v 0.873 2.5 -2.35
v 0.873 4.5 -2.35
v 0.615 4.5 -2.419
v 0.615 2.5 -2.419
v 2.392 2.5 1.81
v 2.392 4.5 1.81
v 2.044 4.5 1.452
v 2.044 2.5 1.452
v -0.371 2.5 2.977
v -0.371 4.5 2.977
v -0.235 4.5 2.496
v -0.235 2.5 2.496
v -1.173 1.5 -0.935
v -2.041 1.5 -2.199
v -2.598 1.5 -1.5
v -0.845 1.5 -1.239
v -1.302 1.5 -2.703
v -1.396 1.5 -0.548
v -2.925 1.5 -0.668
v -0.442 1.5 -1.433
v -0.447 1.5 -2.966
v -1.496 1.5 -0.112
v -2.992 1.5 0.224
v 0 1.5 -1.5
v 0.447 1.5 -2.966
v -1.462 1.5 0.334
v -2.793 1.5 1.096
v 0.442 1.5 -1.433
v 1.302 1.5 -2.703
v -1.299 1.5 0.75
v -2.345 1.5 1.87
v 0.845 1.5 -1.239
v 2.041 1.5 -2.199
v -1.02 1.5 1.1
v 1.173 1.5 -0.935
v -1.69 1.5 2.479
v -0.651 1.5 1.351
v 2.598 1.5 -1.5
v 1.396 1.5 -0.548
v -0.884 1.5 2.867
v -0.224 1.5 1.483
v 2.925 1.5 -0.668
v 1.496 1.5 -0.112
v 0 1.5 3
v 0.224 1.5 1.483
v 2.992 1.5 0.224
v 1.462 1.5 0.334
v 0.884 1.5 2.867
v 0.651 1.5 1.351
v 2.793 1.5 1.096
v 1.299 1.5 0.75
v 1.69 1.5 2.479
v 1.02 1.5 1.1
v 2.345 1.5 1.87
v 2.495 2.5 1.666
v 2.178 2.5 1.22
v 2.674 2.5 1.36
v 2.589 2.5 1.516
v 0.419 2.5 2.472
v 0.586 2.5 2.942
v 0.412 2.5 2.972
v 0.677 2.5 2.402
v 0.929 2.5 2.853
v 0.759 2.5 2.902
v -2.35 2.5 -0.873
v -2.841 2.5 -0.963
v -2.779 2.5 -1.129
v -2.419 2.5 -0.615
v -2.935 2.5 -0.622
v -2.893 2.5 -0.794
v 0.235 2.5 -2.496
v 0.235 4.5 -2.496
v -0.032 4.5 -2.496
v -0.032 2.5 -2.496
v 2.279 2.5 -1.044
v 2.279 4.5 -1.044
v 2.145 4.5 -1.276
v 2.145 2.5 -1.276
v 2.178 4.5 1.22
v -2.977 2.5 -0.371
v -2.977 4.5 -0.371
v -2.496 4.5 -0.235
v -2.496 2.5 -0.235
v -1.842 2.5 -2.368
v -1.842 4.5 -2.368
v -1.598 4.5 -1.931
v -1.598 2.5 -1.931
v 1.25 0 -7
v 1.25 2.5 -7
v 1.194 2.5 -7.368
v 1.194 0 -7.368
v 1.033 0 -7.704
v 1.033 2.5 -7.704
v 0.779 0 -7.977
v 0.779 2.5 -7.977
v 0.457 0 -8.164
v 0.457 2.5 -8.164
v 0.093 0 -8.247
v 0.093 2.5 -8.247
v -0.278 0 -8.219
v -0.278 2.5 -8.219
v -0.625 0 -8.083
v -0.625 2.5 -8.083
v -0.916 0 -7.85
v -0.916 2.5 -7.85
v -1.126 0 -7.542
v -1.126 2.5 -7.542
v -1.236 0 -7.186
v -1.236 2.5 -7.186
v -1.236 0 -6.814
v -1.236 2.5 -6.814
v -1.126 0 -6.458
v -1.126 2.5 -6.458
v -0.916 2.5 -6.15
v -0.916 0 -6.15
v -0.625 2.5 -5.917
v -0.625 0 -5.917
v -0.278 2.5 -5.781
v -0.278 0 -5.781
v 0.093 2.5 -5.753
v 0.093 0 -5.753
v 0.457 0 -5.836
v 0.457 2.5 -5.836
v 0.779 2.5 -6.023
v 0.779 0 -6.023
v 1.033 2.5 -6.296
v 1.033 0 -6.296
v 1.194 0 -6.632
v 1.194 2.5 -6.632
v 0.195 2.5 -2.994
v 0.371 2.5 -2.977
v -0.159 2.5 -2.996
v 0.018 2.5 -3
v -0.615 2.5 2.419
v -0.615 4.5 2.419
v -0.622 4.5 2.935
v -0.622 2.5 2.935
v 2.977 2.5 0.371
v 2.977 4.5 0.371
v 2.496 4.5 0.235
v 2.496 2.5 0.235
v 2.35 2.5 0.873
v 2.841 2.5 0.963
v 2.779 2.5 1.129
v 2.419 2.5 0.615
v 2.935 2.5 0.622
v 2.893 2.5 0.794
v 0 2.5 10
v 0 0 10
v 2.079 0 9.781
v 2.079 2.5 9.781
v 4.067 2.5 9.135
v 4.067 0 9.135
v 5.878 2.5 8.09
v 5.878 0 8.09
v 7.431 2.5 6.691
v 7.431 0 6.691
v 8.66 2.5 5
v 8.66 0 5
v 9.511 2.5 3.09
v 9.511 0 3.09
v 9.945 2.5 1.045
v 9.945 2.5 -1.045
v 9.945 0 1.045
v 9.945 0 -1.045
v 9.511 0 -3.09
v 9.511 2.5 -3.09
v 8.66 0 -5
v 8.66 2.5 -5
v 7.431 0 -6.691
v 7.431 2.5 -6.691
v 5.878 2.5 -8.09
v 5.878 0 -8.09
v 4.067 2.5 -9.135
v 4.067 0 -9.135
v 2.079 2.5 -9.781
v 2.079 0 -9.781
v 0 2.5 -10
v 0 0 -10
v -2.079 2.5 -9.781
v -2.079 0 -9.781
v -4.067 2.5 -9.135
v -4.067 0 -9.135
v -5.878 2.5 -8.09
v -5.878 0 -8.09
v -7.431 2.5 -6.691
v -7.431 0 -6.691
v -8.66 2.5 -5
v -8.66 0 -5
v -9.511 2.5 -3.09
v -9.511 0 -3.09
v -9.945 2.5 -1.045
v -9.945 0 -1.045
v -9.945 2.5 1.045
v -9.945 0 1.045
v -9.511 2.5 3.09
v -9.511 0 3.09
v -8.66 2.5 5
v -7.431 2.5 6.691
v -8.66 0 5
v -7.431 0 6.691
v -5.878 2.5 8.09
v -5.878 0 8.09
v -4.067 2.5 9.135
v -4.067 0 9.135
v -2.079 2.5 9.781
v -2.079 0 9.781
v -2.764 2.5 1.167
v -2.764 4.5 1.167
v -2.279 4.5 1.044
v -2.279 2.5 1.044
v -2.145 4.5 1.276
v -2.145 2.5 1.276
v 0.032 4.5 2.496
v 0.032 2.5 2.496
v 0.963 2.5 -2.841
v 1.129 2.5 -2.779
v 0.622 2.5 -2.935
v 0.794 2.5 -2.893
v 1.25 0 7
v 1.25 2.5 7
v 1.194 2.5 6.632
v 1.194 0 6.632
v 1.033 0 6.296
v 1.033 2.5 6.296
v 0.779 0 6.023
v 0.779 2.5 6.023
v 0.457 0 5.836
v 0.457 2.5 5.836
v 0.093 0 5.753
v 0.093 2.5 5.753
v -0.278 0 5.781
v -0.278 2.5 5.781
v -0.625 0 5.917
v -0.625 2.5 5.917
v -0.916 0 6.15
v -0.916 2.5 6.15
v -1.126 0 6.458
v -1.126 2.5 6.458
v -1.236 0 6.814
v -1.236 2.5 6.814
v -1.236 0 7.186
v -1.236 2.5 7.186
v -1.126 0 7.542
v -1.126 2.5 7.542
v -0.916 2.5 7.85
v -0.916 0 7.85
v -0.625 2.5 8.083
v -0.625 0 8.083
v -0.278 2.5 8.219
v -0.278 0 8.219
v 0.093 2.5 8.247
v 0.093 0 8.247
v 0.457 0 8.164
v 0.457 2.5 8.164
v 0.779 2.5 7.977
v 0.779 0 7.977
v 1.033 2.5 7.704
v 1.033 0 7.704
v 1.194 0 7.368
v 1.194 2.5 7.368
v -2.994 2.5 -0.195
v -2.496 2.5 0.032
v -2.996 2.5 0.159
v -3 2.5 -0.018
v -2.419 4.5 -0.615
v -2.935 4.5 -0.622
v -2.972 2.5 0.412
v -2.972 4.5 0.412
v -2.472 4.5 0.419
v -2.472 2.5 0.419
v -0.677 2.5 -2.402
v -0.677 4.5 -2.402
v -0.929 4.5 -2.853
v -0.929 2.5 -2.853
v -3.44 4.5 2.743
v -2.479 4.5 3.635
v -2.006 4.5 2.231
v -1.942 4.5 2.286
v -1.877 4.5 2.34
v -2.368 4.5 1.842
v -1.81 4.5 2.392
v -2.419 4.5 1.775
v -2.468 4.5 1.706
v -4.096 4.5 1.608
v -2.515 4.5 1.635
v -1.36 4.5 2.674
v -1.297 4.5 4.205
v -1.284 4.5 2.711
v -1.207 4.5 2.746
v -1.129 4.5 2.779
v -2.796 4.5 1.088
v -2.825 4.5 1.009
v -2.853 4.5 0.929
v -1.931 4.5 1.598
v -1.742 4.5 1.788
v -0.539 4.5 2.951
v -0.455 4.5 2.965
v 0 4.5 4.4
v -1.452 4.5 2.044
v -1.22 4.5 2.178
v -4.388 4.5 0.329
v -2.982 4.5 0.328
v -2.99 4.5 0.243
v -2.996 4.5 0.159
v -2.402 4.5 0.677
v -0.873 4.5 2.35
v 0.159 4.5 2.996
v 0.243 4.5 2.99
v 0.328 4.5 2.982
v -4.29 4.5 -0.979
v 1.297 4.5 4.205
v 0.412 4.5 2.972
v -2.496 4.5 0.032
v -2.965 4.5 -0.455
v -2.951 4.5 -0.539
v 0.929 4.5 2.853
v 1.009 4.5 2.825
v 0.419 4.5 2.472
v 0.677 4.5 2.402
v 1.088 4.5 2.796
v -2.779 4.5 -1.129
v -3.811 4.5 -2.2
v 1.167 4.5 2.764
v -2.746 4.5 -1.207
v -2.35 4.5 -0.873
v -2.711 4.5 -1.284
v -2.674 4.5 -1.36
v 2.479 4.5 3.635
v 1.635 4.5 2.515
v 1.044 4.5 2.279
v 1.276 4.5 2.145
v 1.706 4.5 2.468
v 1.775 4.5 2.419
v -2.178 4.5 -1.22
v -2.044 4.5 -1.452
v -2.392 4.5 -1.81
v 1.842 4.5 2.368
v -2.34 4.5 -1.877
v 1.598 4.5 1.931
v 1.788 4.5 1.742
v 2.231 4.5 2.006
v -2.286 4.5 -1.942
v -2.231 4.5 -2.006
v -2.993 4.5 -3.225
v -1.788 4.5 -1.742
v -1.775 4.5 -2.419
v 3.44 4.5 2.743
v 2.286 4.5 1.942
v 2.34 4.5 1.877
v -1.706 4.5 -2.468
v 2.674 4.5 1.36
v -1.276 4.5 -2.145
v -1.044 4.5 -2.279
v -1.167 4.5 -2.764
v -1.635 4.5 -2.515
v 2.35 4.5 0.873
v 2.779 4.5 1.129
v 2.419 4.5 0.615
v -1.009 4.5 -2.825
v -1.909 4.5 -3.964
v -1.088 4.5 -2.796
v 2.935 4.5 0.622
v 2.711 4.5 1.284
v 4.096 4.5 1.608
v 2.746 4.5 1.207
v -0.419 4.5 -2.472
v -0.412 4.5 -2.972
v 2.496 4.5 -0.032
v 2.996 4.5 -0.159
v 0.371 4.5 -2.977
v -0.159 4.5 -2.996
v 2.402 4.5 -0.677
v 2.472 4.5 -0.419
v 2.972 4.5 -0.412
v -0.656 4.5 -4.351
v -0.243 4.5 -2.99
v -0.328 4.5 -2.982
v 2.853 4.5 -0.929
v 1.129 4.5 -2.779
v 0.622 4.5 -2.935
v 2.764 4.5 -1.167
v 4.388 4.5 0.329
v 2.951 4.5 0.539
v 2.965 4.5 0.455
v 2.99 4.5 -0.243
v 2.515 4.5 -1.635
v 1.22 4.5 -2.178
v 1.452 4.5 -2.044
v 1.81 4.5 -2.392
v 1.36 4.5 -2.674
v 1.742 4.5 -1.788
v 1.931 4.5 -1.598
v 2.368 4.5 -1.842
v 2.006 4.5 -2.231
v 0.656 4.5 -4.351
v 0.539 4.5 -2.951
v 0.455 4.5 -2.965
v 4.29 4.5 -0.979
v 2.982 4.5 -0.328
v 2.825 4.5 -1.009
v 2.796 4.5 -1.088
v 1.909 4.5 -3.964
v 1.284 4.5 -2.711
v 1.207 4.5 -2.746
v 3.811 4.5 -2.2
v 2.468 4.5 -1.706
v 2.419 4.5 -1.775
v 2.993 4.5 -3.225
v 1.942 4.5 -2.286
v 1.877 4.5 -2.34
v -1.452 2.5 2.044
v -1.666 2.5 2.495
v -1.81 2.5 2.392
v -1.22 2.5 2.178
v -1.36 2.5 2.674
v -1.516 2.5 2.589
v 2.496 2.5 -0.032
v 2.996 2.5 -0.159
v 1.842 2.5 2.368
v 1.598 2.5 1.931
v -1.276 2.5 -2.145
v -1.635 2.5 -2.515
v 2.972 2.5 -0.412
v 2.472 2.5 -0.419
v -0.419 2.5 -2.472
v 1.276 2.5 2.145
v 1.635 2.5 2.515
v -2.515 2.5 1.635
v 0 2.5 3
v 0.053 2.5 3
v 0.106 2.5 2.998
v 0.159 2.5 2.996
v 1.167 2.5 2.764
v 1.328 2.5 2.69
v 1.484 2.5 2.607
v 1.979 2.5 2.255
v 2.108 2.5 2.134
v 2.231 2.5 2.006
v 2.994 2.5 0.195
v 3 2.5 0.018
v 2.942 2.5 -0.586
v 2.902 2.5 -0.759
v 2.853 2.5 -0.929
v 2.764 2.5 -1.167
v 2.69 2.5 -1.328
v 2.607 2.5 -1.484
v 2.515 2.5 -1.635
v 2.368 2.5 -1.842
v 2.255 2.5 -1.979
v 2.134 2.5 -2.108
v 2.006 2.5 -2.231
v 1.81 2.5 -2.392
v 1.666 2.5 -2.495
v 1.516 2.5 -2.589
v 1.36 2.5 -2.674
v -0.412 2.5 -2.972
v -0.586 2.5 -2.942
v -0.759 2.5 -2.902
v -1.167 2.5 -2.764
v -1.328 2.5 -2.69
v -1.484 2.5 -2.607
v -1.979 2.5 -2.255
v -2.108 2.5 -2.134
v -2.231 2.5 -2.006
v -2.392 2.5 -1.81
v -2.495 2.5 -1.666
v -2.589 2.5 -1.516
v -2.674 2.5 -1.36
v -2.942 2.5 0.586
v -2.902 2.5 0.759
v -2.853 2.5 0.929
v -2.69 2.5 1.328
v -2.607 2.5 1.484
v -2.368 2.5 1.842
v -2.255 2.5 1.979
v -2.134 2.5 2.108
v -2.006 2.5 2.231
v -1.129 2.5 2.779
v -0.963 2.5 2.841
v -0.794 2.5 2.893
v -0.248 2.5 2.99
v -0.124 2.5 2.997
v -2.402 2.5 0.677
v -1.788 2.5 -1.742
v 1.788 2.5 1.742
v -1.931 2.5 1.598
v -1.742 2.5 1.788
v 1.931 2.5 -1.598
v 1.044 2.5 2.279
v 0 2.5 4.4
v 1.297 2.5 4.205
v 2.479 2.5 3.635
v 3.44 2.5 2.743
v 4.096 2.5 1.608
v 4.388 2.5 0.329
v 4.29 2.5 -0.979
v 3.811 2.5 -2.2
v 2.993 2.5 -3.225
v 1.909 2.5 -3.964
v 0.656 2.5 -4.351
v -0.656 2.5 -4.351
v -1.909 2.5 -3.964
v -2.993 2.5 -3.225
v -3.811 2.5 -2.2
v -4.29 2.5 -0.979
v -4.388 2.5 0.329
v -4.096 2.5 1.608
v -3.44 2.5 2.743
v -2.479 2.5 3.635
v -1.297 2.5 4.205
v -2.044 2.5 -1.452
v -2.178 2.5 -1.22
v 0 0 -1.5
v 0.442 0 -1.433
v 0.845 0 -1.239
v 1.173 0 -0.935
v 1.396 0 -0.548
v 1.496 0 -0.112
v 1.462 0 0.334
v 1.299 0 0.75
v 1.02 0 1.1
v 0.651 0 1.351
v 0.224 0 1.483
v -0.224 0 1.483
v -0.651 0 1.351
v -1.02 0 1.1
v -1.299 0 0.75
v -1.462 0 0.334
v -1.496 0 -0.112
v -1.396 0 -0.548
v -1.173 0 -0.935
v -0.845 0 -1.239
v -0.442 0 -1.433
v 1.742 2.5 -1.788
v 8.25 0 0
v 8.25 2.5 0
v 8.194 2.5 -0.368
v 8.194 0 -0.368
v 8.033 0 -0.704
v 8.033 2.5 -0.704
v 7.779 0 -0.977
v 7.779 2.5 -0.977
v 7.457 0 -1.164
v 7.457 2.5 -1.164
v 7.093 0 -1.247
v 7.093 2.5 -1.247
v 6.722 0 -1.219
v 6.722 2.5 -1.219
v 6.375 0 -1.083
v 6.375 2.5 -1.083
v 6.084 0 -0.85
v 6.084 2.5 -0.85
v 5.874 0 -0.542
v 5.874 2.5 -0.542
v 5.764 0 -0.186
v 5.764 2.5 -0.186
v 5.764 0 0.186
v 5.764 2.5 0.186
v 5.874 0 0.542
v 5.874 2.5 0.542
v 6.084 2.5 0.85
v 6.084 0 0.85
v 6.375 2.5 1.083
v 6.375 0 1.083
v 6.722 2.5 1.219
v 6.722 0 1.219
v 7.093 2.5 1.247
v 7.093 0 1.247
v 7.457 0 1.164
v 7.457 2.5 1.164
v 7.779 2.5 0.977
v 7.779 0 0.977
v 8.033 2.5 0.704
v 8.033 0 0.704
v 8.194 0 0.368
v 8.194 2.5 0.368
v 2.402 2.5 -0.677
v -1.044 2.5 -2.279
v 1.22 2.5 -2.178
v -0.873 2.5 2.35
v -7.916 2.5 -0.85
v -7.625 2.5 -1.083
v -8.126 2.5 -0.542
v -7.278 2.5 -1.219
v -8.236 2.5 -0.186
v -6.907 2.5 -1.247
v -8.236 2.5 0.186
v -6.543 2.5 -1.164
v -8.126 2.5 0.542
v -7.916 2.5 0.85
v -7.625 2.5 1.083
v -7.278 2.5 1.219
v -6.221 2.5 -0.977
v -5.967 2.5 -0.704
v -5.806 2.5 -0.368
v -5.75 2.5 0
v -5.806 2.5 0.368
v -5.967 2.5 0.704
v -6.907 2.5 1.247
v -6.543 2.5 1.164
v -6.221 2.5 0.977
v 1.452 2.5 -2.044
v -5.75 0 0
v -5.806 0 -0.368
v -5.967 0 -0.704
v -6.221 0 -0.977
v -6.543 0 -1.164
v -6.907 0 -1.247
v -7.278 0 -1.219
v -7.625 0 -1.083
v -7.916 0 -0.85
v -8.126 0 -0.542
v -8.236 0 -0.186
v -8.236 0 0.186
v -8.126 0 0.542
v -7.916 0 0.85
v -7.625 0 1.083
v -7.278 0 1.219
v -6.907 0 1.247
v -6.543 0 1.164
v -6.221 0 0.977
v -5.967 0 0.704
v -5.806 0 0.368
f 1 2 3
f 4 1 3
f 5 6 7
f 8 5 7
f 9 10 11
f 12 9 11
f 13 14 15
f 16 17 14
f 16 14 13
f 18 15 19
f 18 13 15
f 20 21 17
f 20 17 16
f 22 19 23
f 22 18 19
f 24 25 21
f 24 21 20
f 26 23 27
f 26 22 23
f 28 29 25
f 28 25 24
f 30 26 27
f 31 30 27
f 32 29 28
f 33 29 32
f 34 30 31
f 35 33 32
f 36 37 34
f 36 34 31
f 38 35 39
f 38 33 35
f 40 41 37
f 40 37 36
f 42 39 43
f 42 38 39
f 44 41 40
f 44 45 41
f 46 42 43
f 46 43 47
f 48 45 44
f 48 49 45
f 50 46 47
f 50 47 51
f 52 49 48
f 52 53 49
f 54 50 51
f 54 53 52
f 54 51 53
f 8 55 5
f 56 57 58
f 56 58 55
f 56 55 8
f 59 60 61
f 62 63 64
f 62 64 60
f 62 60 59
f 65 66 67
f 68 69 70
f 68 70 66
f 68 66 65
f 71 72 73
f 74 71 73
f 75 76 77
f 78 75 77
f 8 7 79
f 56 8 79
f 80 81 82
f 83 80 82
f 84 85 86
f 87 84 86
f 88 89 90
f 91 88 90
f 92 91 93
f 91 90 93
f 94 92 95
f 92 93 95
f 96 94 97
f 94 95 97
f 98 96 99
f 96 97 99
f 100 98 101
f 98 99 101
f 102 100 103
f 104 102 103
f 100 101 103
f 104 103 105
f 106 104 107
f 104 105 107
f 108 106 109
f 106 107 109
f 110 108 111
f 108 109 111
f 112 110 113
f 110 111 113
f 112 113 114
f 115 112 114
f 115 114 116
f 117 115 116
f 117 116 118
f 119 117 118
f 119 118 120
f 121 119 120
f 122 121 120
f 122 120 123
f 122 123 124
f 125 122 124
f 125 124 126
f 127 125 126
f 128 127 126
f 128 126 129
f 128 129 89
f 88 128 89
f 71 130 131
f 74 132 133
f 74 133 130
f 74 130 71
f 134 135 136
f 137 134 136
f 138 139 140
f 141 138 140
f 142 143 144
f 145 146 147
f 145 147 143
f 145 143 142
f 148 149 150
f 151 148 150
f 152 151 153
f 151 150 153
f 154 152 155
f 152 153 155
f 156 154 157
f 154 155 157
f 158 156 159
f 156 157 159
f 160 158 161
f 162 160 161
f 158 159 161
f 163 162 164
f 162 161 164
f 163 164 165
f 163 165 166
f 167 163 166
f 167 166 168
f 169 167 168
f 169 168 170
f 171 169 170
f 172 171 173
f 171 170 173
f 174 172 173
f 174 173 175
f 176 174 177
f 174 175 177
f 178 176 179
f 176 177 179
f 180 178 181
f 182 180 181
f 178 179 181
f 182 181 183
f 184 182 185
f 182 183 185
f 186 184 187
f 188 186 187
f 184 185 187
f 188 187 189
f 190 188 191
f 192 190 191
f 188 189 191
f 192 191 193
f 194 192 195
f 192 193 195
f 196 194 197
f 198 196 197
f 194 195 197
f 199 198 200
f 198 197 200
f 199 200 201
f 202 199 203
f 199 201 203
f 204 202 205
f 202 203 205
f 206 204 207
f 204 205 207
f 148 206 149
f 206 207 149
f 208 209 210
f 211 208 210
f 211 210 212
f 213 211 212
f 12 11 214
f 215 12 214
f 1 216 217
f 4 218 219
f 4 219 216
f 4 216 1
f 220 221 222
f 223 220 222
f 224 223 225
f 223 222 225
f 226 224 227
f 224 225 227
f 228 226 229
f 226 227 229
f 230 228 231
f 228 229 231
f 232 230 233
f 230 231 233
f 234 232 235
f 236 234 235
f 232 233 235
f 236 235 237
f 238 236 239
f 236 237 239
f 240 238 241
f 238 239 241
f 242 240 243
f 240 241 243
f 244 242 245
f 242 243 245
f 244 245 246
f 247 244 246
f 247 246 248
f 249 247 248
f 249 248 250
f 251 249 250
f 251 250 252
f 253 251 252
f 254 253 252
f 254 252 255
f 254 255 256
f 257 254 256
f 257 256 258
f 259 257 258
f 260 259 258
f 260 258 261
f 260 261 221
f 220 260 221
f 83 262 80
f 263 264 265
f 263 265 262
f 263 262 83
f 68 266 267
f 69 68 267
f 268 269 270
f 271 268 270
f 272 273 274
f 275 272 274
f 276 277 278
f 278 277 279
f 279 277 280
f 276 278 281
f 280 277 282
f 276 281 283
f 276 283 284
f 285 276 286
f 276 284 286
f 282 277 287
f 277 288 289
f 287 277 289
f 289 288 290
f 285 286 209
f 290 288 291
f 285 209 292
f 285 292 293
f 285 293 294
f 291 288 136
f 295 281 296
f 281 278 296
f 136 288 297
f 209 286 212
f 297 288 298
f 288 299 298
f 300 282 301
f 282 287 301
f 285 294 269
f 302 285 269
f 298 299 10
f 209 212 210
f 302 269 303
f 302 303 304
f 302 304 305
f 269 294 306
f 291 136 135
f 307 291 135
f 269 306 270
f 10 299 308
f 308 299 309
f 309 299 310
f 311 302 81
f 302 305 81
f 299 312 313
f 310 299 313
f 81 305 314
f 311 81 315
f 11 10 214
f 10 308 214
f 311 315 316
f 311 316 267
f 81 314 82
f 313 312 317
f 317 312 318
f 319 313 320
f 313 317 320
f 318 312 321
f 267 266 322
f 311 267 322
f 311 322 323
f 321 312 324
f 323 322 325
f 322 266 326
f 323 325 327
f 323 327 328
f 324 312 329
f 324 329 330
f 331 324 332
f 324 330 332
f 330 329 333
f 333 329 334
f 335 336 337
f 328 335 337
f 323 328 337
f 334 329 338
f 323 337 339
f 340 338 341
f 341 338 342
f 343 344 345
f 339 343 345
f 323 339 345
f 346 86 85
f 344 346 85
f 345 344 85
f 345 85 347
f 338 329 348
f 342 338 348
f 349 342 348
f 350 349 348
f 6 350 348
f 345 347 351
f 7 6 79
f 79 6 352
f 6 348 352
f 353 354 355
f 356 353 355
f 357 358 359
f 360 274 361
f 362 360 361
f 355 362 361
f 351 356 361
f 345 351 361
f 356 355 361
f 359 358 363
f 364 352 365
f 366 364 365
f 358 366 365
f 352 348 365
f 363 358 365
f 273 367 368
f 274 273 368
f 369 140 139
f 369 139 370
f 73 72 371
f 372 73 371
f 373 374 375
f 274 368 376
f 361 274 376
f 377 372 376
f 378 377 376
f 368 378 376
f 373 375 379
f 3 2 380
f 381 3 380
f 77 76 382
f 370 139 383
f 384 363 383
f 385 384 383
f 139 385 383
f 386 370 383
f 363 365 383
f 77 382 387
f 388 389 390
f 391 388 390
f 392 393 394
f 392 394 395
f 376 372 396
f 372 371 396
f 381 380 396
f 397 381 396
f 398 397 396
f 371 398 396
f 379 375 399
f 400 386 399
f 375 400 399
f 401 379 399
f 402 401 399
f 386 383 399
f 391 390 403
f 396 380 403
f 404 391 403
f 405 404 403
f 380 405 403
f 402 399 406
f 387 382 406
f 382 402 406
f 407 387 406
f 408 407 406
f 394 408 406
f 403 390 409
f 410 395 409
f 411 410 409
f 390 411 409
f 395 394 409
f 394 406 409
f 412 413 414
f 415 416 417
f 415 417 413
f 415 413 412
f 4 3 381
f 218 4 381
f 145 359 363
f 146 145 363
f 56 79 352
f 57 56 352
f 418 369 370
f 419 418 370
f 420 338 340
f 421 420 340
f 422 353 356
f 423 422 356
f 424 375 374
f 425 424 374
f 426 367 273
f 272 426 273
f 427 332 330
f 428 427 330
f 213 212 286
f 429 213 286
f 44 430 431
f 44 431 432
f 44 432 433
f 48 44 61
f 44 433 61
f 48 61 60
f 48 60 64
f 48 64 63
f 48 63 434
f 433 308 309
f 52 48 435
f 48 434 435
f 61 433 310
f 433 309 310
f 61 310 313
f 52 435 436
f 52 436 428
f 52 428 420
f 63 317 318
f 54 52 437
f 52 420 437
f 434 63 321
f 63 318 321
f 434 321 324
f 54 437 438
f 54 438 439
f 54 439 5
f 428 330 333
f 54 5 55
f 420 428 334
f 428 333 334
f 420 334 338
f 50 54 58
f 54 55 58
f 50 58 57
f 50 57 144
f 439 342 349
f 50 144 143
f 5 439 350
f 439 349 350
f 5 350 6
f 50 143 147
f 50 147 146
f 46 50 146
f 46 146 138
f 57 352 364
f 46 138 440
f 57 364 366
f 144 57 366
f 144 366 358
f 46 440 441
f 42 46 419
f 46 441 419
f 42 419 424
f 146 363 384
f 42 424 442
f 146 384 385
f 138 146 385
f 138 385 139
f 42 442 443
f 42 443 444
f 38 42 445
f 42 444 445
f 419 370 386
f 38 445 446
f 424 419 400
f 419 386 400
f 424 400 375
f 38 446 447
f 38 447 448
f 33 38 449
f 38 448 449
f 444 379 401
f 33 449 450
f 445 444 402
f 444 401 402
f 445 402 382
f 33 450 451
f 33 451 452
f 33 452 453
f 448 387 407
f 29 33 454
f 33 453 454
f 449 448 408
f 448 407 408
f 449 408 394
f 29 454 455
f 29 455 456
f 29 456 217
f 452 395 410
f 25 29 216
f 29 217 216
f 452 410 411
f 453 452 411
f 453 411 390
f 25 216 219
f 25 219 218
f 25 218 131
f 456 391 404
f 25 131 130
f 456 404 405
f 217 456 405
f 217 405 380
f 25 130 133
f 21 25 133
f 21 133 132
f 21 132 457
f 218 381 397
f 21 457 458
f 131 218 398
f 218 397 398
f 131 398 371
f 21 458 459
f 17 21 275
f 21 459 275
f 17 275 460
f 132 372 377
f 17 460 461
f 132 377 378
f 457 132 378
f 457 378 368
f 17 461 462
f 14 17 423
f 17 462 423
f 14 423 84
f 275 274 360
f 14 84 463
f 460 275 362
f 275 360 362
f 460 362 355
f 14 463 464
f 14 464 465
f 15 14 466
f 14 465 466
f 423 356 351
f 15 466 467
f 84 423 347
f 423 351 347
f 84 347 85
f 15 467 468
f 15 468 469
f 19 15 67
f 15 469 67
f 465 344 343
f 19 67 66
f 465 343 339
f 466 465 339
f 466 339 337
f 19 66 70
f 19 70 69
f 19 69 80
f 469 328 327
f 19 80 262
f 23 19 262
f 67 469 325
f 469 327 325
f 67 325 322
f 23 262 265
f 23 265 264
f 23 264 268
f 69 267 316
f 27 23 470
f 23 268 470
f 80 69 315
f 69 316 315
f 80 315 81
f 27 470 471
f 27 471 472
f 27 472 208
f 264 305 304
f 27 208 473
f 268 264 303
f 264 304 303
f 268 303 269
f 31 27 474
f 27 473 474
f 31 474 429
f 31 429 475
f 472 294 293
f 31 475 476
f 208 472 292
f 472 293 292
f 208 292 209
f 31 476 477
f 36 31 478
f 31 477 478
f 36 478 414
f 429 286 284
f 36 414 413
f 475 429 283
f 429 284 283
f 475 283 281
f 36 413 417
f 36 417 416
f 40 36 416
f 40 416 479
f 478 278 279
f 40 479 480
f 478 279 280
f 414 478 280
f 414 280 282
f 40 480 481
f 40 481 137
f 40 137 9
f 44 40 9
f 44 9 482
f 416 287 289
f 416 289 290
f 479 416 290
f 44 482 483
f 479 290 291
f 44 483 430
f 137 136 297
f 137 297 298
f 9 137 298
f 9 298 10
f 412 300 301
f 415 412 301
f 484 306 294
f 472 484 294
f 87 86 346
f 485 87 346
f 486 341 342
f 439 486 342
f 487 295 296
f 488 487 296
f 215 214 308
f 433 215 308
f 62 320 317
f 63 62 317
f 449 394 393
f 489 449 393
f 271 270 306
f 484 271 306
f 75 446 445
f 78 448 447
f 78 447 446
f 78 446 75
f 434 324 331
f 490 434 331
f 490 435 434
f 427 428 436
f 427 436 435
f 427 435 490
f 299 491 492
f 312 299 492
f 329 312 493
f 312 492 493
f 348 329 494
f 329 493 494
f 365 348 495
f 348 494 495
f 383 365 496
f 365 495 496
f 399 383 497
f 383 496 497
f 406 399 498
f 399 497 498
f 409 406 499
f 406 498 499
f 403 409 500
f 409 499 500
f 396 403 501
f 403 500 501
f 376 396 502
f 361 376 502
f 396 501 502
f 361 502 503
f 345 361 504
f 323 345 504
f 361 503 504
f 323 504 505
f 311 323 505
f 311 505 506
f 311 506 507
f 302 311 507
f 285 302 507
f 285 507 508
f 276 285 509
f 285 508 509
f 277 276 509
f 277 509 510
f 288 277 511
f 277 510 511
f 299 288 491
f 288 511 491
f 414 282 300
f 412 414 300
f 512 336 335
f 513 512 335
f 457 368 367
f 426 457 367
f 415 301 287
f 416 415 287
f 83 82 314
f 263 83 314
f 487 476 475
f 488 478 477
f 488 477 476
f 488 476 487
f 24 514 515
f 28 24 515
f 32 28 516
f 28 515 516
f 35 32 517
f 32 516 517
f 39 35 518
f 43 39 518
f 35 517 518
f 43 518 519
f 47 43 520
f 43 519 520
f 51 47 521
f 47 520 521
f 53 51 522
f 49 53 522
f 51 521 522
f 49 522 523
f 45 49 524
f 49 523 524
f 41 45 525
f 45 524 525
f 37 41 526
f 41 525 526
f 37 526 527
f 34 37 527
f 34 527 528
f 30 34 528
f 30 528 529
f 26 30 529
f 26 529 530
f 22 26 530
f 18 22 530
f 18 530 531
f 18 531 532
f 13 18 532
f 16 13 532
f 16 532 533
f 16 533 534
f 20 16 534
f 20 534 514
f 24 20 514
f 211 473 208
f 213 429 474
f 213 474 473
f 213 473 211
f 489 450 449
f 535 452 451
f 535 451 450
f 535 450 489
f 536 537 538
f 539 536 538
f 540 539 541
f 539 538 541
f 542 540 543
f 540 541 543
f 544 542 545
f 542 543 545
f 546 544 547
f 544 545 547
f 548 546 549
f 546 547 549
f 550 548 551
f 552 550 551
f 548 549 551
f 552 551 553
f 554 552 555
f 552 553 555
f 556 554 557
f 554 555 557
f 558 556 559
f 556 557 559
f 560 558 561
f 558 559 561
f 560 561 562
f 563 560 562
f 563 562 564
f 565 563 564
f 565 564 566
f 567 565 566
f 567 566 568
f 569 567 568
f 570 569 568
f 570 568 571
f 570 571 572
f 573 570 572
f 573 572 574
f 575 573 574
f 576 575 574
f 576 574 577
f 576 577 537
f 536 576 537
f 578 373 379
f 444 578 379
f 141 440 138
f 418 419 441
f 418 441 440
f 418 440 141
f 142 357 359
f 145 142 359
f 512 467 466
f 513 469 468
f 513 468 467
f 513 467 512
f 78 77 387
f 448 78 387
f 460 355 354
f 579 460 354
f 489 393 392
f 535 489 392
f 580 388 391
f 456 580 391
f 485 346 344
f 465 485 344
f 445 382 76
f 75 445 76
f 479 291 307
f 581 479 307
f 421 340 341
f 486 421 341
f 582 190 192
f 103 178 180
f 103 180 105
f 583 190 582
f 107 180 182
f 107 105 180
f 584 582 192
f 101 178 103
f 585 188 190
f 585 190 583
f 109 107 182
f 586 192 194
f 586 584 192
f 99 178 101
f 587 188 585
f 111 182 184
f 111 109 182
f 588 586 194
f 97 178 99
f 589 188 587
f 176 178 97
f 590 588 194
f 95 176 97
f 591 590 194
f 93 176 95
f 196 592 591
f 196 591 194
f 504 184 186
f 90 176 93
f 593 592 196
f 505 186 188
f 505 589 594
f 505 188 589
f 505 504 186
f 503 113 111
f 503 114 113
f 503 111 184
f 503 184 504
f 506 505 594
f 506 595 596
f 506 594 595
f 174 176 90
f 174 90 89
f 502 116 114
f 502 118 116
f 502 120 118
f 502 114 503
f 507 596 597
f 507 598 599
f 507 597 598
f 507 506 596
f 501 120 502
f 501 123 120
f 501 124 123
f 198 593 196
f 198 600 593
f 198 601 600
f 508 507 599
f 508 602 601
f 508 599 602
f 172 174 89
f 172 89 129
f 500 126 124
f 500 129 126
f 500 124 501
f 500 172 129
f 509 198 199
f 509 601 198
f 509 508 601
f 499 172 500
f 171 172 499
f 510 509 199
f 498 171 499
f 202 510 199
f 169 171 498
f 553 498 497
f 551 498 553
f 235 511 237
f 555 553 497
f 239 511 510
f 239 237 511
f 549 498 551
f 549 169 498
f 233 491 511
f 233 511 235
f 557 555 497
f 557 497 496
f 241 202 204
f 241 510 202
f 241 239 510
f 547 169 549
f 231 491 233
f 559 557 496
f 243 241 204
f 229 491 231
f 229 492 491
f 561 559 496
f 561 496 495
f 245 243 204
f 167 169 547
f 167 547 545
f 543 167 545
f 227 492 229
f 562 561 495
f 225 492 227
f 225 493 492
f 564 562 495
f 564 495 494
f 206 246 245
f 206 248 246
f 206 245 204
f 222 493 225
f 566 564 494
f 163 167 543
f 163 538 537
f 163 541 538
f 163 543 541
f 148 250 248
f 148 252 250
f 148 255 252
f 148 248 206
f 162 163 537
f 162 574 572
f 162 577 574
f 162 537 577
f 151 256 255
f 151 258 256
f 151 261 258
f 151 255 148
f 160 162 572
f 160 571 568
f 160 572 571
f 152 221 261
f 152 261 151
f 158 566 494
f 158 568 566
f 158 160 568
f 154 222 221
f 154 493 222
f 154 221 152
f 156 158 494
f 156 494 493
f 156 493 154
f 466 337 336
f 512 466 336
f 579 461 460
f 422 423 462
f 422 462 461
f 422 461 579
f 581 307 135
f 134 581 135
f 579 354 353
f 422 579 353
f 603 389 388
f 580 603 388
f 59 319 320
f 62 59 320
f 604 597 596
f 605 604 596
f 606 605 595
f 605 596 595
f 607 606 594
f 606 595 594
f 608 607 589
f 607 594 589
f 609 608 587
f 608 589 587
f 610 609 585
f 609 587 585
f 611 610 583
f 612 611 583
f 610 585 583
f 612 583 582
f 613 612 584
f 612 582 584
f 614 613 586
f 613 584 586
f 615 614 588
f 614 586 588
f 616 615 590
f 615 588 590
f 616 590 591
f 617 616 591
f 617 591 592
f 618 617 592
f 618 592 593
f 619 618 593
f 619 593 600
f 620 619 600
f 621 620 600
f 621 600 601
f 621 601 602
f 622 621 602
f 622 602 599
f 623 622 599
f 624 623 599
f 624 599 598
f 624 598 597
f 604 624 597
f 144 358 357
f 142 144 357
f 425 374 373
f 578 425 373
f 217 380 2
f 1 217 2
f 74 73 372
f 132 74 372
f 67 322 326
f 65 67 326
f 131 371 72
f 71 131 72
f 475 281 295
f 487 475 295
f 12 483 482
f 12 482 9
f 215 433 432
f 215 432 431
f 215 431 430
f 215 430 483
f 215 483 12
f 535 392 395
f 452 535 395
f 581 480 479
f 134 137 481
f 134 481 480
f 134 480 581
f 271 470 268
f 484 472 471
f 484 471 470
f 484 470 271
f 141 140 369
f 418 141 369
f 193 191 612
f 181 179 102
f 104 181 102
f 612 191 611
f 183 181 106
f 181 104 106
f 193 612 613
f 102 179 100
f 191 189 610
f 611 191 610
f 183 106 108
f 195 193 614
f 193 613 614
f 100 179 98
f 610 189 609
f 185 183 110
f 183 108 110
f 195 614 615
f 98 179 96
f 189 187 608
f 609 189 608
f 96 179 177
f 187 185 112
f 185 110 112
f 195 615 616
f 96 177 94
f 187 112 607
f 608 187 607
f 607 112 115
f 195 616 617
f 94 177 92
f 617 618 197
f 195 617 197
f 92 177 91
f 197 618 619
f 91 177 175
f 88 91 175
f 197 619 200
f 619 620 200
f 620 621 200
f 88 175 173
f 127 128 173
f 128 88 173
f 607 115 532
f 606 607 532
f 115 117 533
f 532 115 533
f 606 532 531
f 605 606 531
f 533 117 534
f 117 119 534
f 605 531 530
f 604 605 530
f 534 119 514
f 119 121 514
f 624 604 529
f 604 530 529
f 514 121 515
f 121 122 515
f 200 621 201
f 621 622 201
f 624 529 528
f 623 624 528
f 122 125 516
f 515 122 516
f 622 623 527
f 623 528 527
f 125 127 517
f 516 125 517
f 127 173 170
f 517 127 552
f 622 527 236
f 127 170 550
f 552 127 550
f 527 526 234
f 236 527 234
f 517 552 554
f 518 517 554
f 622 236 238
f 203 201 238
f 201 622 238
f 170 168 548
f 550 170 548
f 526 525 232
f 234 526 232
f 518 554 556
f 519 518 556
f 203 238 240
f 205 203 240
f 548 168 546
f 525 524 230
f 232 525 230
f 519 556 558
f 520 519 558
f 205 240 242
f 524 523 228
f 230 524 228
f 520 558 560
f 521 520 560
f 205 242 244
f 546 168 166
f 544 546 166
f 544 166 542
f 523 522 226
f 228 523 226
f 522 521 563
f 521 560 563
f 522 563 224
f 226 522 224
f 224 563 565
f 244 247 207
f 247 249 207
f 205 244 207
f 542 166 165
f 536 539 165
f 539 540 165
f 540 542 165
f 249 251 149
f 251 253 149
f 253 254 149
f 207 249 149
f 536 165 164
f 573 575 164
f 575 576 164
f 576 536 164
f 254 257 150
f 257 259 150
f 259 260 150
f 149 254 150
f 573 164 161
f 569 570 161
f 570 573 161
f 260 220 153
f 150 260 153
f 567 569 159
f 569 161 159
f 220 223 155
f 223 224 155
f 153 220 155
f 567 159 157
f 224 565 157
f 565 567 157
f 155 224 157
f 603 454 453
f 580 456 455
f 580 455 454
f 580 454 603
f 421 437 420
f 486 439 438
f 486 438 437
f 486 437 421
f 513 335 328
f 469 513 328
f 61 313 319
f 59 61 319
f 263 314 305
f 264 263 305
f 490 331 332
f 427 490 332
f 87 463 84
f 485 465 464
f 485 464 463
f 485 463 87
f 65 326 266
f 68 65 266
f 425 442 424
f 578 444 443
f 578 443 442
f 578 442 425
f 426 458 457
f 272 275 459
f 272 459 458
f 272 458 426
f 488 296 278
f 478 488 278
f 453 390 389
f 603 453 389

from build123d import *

# Parameters (mm, degrees)
SKETCH_4_R               = 10
EXTRUDE_2_DEPTH          = 2.5
SKETCH_7_R               = 4.4
EXTRUDE_3_DEPTH          = 2
SKETCH_8_R               = 3
CUT_EXTRUDE_10_DEPTH     = 3
EXTRUDE_5_DEPTH          = 2
PATTERN_CIRCULAR_1_COUNT = 24
HOLE_WIZARD_M3_1_D       = 2.5
CUT_EXTRUDE_11_REACH     = 16.841
SKETCH_18_R              = 1.5


with BuildPart() as part:
    # 草图4 → 凸台-拉伸2 (new body)
    with BuildSketch(Plane(origin=(0, 0, 0), x_dir=(1, 0, 0), z_dir=(0, 1, 0))):
        Circle(SKETCH_4_R)
    extrude(amount=EXTRUDE_2_DEPTH)

    # 草图7 → 凸台-拉伸3 (add)
    with BuildSketch(Plane(origin=(0, 2.5, 0), x_dir=(1, 0, 0), z_dir=(0, 1, 0))):
        Circle(SKETCH_7_R)
    extrude(amount=EXTRUDE_3_DEPTH)

    # 草图8 → 切除-拉伸10 (cut)
    with BuildSketch(Plane(origin=(0, 4.5, 0), x_dir=(1, 0, 0), z_dir=(0, 1, 0))):
        Circle(SKETCH_8_R)
    extrude(amount=-CUT_EXTRUDE_10_DEPTH, mode=Mode.SUBTRACT)

    # 草图14 → 凸台-拉伸5 (add)
    with BuildSketch(Plane(origin=(0, 4.5, 0), x_dir=(1, 0, 0), z_dir=(0, 1, 0))):
        with BuildLine():
            Line((2.976910005, -0.371492698), (2.495792863, -0.23538136))
            Line((2.495792863, -0.23538136), (2.495792863, 0.032272898))
            Line((2.495792863, 0.032272898), (2.995792863, 0.158824181))
            ThreePointArc((2.995792863, 0.158824181), (2.998100046, -0.106752588), (2.976910005, -0.371492698))
        make_face()
    extrude_5 = extrude(amount=-EXTRUDE_5_DEPTH)

    # 阵列(圆周)1: 凸台-拉伸5 ×24 about axis
    pattern_circular_1_axis = Axis((0, 4.5, 0), (0, 1, 0))
    for i in range(1, PATTERN_CIRCULAR_1_COUNT):
        add(extrude_5.rotate(pattern_circular_1_axis, i * 360 / PATTERN_CIRCULAR_1_COUNT))

    # M3 螺纹孔1 (through all)
    with Locations(Plane(origin=(0, 0, 0), x_dir=(-1, 0, 0), z_dir=(0, -1, 0))):
        with Locations((0, -7), (7, 0), (0, 7), (-7, 0)):
            Hole(HOLE_WIZARD_M3_1_D / 2)

    # 草图18 → 切除-拉伸11 (cut, up to next)
    with BuildSketch(Plane.XZ, mode=Mode.PRIVATE) as cut_extrude_11_sk1:
        Circle(SKETCH_18_R)
    cut_extrude_11_tool1 = extrude(cut_extrude_11_sk1.sketch, amount=-CUT_EXTRUDE_11_REACH, mode=Mode.PRIVATE) & part.part
    add(cut_extrude_11_tool1.solids().sort_by_distance((0, 0, 0))[0], mode=Mode.SUBTRACT)


solid = part.part
